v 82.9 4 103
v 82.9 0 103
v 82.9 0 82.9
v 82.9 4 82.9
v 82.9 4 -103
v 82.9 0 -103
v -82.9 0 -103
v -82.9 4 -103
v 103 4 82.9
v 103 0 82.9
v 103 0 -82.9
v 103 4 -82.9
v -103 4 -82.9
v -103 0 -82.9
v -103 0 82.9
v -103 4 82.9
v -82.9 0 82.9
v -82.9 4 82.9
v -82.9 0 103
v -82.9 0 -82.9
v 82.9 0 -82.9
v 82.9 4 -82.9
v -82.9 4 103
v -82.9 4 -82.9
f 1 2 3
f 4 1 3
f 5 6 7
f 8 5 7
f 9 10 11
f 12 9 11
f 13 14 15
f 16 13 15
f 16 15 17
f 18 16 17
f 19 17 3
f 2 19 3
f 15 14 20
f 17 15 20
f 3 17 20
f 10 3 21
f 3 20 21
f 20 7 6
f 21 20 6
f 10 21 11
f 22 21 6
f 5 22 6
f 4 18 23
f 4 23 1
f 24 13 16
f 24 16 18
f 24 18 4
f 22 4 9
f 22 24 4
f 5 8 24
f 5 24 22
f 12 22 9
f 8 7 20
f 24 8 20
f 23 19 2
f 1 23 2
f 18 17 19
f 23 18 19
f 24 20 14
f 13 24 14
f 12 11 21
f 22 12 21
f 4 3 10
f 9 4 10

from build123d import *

# Parameters (mm, degrees)
SKETCH1_W           = 42
SKETCH1_H           = 42
BOSS_EXTRUDE1_DEPTH = 4


with BuildPart() as part:
    # Sketch1 → Boss-Extrude1 (new body)
    with BuildSketch(Plane(origin=(0, 0, 0), x_dir=(1, 0, 0), z_dir=(0, 1, 0))):
        Polygon((-82.9, -82.9), (-82.9, -103), (82.9, -103), (82.9, -82.9), (103, -82.9), (103, 82.9), (82.9, 82.9), (82.9, 103), (-82.9, 103), (-82.9, 82.9), (-103, 82.9), (-103, -82.9), align=None)
        Rectangle(SKETCH1_W, SKETCH1_H, mode=Mode.SUBTRACT)
        Rectangle(SKETCH1_W, SKETCH1_H)
    extrude(amount=BOSS_EXTRUDE1_DEPTH)


solid = part.part
